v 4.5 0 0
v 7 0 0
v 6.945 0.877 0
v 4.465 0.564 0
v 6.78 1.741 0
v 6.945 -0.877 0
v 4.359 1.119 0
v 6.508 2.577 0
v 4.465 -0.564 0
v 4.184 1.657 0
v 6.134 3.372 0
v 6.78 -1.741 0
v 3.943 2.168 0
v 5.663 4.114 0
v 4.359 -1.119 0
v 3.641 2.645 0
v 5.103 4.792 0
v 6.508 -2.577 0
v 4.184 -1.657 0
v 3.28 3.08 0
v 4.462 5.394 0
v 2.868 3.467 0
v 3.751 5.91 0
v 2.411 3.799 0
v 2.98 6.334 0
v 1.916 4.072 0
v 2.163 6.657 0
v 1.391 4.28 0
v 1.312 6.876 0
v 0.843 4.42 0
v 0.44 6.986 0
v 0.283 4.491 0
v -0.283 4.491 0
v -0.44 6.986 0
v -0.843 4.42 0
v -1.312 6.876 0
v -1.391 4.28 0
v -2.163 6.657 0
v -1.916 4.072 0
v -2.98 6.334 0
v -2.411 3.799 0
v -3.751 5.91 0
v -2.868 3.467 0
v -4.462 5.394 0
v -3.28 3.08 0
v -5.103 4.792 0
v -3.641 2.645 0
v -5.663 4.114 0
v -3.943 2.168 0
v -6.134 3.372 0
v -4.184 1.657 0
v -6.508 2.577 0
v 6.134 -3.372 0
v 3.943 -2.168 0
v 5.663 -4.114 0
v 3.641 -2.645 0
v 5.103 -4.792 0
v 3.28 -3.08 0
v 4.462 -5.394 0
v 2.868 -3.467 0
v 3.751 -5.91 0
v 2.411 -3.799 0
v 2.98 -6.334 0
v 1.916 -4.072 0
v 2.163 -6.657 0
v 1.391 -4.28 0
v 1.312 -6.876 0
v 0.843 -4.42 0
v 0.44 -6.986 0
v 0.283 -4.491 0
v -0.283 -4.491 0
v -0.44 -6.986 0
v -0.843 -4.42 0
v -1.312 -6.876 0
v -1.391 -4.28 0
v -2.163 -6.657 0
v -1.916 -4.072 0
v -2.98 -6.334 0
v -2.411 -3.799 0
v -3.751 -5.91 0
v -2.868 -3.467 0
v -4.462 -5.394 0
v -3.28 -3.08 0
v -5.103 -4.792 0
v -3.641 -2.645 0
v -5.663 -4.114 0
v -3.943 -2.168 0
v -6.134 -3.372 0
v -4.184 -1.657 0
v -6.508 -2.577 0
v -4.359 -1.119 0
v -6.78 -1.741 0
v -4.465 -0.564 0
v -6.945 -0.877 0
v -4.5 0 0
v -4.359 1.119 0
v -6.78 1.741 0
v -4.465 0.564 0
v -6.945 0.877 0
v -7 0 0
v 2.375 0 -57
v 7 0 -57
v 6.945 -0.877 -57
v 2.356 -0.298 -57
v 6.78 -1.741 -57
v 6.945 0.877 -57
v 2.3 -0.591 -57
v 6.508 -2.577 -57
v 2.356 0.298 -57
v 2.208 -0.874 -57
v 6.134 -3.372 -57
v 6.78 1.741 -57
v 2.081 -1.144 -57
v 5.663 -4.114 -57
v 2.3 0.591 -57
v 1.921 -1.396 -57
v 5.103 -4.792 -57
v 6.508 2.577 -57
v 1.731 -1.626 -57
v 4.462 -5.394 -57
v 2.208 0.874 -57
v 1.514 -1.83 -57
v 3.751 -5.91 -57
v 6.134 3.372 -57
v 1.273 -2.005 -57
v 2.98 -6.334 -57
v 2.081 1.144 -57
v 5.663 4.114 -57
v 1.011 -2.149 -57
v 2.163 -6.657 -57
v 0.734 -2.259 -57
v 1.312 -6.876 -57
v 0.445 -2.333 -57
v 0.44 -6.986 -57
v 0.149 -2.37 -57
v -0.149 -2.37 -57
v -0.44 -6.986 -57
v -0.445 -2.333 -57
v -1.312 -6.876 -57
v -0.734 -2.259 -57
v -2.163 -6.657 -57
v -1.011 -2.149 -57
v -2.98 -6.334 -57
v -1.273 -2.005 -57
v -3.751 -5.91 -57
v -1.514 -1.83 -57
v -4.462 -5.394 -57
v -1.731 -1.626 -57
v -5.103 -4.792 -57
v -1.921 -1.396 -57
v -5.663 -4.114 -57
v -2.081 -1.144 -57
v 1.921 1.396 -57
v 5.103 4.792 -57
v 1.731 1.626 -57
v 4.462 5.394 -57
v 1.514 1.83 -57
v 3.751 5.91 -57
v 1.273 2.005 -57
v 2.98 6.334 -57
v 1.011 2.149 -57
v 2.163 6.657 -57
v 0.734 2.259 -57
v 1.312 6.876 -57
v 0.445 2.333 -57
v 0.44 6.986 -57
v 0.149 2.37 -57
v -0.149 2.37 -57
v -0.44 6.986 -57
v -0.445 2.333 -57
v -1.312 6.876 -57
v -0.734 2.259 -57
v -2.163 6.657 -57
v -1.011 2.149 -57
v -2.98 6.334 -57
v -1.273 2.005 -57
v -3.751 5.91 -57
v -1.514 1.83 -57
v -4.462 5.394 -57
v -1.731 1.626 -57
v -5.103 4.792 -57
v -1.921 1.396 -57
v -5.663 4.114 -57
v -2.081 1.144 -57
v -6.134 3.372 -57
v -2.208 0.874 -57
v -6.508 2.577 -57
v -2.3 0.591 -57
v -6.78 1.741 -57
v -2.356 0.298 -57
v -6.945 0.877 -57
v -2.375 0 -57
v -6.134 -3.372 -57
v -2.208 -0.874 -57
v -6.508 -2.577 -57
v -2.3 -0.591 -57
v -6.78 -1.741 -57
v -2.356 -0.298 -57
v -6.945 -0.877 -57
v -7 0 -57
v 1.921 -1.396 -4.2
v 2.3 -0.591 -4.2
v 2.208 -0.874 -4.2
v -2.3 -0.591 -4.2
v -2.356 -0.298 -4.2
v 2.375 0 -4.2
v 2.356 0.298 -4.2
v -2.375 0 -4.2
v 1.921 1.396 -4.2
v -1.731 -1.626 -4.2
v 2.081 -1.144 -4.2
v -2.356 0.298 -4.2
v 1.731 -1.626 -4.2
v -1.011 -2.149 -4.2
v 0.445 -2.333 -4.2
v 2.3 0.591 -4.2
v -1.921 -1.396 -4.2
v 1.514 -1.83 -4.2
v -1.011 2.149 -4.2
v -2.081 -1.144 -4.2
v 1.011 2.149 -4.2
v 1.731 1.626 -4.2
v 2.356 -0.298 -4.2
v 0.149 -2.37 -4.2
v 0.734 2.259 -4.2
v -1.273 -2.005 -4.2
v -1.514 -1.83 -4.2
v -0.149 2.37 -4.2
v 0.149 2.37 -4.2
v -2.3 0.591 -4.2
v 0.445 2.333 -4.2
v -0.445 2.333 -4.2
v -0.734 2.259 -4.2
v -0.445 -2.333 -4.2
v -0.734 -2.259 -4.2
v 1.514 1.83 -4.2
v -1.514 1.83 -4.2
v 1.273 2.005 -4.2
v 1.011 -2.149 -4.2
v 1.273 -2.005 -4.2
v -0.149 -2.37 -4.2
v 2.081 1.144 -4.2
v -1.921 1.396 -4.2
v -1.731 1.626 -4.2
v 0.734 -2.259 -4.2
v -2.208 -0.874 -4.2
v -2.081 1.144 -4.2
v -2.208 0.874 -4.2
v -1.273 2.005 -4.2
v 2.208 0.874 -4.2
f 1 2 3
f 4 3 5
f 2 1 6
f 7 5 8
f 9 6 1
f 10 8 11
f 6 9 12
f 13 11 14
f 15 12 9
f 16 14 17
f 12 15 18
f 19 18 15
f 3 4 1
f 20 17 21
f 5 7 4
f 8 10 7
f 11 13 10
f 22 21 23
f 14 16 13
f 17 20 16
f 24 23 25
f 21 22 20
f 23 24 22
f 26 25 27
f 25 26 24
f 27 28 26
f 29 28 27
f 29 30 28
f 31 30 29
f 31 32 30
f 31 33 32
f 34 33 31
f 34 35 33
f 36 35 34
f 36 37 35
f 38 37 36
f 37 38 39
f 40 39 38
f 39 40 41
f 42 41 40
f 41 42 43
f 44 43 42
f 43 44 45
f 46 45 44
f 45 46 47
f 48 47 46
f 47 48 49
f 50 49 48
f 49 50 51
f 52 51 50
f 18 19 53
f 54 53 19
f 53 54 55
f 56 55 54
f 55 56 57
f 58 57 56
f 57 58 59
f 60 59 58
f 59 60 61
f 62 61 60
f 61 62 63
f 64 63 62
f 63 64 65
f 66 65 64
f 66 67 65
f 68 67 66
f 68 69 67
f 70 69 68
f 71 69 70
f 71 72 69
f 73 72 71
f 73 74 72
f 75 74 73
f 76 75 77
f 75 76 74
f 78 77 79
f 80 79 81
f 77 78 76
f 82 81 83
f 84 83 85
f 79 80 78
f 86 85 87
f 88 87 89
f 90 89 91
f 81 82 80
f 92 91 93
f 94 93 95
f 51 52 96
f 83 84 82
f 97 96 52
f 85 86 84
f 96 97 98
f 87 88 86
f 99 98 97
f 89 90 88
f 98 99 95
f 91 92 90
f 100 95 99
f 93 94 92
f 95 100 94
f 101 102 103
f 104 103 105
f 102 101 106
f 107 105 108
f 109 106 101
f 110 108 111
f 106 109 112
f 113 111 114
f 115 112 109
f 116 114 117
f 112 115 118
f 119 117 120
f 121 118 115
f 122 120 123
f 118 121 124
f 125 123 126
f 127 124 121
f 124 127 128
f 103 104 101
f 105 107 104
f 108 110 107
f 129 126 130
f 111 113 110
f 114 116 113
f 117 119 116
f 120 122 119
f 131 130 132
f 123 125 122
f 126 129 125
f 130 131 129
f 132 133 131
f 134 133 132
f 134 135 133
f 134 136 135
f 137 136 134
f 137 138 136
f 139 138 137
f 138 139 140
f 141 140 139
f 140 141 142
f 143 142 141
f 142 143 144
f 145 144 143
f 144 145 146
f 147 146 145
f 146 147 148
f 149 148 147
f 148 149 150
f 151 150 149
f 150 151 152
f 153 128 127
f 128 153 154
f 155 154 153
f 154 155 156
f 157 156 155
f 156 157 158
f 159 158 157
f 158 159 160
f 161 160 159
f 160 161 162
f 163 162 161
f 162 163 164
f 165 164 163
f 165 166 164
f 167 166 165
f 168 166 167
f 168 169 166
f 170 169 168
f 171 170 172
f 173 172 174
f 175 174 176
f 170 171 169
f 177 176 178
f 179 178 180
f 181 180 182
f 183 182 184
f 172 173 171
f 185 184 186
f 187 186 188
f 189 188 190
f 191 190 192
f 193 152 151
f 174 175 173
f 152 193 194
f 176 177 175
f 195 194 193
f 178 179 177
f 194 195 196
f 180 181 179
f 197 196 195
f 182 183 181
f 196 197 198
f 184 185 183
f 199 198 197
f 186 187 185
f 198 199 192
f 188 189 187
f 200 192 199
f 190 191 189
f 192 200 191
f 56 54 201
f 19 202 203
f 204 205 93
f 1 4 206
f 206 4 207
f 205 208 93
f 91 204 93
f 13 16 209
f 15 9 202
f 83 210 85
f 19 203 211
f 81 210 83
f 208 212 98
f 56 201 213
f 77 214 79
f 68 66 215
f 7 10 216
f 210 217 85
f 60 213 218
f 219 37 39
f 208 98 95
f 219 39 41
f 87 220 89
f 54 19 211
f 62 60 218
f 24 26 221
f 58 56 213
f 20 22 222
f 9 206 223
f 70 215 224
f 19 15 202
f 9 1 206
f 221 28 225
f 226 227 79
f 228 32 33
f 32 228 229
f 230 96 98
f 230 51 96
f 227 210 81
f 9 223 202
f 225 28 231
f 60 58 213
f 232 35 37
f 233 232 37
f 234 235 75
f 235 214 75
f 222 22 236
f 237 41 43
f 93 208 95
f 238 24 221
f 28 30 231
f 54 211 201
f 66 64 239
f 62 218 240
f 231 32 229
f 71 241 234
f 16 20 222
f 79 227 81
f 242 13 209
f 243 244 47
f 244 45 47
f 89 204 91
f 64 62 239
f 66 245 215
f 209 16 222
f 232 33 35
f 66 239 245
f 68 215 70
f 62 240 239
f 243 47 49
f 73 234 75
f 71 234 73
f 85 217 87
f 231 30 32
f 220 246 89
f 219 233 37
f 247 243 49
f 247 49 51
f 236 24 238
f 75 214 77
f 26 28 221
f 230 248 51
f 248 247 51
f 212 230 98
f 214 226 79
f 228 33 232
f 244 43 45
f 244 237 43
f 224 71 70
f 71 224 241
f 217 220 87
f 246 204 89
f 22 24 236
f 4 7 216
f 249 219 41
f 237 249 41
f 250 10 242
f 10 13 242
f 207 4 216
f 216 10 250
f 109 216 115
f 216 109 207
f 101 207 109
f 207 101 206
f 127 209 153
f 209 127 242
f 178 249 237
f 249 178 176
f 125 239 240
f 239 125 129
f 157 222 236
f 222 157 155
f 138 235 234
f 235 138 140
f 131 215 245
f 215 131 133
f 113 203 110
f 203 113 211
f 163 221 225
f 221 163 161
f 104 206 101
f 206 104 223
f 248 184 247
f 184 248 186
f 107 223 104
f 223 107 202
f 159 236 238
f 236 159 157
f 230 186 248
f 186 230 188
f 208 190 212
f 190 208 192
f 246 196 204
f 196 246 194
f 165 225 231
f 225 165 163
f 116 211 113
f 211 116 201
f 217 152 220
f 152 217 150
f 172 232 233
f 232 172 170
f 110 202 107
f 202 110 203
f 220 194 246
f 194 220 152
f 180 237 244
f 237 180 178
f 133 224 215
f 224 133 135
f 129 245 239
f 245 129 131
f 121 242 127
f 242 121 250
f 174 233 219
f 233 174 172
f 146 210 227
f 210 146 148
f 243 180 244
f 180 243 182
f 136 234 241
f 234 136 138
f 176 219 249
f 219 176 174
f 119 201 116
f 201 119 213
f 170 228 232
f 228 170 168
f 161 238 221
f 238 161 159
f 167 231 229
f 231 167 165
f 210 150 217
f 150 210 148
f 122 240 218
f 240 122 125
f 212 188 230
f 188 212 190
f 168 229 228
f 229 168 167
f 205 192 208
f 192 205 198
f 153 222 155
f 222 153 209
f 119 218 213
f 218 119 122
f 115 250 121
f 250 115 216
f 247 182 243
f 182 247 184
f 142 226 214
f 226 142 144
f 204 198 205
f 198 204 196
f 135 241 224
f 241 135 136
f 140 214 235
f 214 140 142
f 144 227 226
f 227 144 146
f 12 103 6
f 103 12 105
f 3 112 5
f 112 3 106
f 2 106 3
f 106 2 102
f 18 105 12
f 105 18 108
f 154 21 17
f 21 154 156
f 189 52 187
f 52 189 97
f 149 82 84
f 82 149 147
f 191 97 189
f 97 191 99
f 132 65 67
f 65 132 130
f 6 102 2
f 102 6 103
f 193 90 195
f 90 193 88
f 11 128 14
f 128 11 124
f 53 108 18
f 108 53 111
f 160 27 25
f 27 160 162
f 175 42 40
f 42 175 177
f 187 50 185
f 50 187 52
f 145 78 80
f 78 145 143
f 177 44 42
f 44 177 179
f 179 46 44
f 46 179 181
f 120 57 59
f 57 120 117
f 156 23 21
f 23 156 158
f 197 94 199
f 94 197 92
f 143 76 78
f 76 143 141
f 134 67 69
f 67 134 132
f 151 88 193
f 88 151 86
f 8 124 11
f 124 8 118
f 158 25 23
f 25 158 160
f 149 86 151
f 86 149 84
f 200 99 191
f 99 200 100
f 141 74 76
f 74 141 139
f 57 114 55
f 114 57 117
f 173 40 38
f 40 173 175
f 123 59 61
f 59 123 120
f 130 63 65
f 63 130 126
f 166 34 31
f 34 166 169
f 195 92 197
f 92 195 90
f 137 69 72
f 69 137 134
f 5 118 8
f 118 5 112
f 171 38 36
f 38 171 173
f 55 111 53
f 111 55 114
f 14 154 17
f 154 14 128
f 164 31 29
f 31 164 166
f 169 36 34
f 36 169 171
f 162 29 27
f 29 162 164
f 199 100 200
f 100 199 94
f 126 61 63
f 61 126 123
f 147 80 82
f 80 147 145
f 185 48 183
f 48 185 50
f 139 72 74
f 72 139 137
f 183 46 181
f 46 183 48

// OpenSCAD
$fn = 50;


difference() {
	union() {
		translate(v = [0, 0, -57.0000000000]) {
			cylinder(h = 57, r = 7.0000000000);
		}
		cylinder(h = 0, r = 17.0000000000);
	}
	union() {
		translate(v = [0, 0, 0]) {
			rotate(a = [0, 0, 0]) {
				difference() {
					union() {
						#translate(v = [0, 0, -57.0000000000]) {
							cylinder(h = 57, r = 2.2500000000);
						}
						#translate(v = [0, 0, -4.2000000000]) {
							cylinder(h = 4.2000000000, r1 = 2.3750000000, r2 = 4.5000000000);
						}
						#translate(v = [0, 0, -57.0000000000]) {
							cylinder(h = 57, r = 2.3750000000);
						}
						#translate(v = [0, 0, -57.0000000000]) {
							cylinder(h = 57, r = 2.2500000000);
						}
					}
					union();
				}
			}
		}
	}
}
